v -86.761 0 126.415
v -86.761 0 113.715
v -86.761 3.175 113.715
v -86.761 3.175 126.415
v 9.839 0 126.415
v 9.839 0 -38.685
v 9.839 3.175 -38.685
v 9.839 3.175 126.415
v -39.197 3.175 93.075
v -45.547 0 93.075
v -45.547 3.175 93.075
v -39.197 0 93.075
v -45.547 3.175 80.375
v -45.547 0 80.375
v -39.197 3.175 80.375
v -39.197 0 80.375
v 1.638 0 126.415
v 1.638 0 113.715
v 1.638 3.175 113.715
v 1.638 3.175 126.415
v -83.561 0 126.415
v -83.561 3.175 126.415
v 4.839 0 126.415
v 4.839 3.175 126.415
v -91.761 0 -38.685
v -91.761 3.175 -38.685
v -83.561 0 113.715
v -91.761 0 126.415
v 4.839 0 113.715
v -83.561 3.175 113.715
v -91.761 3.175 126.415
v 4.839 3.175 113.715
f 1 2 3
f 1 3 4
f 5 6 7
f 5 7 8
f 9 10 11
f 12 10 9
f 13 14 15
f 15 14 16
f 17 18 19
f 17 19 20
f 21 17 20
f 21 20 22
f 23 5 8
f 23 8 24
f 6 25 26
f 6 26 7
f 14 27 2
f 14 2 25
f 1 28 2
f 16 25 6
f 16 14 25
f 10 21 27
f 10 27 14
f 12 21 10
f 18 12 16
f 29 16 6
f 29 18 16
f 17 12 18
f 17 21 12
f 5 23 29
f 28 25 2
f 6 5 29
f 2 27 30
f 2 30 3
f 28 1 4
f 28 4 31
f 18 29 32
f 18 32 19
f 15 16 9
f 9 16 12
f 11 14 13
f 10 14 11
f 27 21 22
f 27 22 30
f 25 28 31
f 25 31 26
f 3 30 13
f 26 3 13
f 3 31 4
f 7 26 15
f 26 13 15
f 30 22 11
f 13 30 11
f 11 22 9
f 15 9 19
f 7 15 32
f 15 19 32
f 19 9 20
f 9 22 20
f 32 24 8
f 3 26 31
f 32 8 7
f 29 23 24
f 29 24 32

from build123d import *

# Parameters (mm, degrees)
F0_W     = 53.34
F0_H     = 73.66
F0_W_2   = 6.35
F0_H_2   = 12.7
F1_DEPTH = 3.175


with BuildPart() as f1:
    # F0 (on Front) → F1 (new body)
    with BuildSketch(Plane.XZ):
        Polygon((-86.761358, 126.414508), (-91.761358, 126.414508), (-91.761358, -38.685492), (9.838642, -38.685492), (9.838642, 126.414508), (4.838642, 126.414508), (4.838642, 113.714508), (1.638242, 113.714508), (1.638242, 126.414508), (-83.560958, 126.414508), (-83.560958, 113.714508), (-86.761358, 113.714508), align=None)
        with Locations((-41.98038, 29.224732)):
            Rectangle(F0_W, F0_H, mode=Mode.SUBTRACT)
        with Locations((-42.371655, 86.725142)):
            Rectangle(F0_W_2, F0_H_2, mode=Mode.SUBTRACT)
        with Locations((-41.98038, 29.224732)):
            Rectangle(F0_W, F0_H)
    extrude(amount=-F1_DEPTH)


solid = f1.part
